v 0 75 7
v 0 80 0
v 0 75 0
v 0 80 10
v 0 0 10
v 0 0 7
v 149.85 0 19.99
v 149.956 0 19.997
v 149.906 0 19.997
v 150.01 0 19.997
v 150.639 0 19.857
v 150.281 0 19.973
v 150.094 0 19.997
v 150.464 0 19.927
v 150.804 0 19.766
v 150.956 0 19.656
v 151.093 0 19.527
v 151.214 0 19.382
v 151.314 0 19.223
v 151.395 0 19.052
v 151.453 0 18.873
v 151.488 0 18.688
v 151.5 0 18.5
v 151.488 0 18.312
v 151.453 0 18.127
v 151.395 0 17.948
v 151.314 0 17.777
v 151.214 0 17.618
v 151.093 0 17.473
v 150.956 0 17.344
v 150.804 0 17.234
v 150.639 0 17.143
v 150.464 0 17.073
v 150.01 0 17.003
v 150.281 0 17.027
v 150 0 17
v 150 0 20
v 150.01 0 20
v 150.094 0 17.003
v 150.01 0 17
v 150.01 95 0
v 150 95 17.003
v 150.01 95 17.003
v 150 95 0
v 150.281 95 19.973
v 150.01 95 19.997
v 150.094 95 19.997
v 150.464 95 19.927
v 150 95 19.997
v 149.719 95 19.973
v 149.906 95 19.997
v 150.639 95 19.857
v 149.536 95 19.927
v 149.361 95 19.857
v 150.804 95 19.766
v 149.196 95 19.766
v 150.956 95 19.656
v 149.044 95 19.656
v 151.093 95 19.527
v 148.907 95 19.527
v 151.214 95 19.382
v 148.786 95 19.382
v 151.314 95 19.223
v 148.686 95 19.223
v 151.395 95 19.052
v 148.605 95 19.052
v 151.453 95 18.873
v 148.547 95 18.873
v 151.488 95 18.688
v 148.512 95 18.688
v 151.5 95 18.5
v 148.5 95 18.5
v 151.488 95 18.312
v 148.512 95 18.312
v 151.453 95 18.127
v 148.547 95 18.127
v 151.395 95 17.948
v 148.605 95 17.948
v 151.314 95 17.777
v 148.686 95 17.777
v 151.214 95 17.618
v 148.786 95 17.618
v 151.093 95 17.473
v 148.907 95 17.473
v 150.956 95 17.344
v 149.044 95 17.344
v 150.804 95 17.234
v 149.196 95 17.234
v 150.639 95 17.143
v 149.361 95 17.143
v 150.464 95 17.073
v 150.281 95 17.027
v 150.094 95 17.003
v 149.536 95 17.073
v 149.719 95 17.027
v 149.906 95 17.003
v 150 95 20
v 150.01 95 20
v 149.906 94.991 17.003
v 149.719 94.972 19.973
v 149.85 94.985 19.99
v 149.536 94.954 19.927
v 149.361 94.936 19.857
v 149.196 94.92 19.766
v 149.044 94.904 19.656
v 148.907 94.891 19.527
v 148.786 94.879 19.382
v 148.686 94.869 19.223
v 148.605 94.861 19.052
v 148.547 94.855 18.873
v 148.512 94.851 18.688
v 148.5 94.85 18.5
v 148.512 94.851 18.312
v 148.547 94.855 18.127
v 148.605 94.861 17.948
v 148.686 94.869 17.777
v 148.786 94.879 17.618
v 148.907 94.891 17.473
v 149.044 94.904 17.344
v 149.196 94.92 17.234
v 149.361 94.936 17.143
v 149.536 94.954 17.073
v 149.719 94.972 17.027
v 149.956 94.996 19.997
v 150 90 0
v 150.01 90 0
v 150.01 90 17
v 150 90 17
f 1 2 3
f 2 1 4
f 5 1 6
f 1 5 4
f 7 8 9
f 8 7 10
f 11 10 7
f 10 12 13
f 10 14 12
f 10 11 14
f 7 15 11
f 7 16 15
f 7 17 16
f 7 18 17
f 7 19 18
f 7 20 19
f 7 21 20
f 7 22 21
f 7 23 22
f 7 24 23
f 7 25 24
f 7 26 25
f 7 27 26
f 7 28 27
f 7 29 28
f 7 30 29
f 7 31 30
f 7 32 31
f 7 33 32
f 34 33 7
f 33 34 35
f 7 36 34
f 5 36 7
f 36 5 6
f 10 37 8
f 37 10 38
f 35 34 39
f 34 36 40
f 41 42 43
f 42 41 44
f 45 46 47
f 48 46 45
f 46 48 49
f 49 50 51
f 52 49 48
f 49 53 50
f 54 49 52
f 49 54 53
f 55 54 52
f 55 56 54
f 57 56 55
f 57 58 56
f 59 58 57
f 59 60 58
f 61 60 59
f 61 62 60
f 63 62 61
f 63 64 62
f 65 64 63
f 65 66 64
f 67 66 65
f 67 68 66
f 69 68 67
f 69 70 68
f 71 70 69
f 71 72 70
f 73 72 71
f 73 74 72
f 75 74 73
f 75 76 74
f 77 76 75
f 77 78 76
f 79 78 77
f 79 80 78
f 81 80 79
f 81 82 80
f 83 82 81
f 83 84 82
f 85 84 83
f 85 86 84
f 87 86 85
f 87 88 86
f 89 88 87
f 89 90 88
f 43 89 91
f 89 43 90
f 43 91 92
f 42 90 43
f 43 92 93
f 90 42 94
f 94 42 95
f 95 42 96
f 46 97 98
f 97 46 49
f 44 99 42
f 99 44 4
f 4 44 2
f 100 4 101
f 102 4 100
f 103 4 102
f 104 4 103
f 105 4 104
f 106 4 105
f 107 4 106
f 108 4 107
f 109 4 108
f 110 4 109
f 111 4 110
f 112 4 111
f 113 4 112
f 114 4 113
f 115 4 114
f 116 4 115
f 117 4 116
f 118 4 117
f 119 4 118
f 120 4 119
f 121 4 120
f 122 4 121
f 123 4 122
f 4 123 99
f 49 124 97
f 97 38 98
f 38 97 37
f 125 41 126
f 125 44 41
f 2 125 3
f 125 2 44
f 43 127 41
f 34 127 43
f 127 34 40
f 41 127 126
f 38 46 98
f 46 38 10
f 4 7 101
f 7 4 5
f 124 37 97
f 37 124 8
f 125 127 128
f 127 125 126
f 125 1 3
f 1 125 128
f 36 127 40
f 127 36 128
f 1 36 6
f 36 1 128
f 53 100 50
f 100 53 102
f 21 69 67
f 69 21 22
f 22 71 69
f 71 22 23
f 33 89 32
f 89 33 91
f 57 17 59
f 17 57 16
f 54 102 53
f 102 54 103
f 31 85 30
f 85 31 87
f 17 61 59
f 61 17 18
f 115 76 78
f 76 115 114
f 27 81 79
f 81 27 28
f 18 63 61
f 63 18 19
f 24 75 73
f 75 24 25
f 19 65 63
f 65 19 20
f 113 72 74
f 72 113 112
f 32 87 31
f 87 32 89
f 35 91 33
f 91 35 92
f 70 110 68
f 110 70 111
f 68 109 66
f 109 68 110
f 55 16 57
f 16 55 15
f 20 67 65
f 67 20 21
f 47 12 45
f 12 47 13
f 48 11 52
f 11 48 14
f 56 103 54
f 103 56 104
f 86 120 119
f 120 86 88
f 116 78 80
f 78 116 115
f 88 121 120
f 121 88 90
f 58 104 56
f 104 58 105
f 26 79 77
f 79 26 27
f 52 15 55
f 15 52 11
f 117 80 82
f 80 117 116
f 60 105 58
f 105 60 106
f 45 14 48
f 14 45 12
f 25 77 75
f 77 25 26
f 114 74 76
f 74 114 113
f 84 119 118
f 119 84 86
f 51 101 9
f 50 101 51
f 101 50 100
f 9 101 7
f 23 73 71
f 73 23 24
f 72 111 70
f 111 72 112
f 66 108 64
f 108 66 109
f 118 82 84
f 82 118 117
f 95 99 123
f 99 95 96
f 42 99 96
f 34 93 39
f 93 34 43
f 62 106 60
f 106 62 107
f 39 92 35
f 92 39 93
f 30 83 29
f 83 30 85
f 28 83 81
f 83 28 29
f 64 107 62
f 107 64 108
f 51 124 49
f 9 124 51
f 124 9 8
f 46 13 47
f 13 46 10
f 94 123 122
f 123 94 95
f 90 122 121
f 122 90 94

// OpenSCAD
$fn = 50;

length = 150;
deepL = 95;
deepR = 80;

errorTallL=20;
errorTallR=10;

color("BLUE") frame();

color("RED") translate([length,deepL,errorTallL-1.5]) rotate([90,0,0]) cylinder(h=deepL, d=3, center=false);

module frame(){
    difference(){
        hull() {
            cube([0.01,deepR,errorTallR]);
            translate([length,0,0]) cube([0.01,deepL,errorTallL]);
        }
        
        hull() {
            cube([0.01,deepR-5,errorTallR-3]);
            translate([length,0,0]) cube([0.01,deepL-5,errorTallL-3]);
        }
    }
}
